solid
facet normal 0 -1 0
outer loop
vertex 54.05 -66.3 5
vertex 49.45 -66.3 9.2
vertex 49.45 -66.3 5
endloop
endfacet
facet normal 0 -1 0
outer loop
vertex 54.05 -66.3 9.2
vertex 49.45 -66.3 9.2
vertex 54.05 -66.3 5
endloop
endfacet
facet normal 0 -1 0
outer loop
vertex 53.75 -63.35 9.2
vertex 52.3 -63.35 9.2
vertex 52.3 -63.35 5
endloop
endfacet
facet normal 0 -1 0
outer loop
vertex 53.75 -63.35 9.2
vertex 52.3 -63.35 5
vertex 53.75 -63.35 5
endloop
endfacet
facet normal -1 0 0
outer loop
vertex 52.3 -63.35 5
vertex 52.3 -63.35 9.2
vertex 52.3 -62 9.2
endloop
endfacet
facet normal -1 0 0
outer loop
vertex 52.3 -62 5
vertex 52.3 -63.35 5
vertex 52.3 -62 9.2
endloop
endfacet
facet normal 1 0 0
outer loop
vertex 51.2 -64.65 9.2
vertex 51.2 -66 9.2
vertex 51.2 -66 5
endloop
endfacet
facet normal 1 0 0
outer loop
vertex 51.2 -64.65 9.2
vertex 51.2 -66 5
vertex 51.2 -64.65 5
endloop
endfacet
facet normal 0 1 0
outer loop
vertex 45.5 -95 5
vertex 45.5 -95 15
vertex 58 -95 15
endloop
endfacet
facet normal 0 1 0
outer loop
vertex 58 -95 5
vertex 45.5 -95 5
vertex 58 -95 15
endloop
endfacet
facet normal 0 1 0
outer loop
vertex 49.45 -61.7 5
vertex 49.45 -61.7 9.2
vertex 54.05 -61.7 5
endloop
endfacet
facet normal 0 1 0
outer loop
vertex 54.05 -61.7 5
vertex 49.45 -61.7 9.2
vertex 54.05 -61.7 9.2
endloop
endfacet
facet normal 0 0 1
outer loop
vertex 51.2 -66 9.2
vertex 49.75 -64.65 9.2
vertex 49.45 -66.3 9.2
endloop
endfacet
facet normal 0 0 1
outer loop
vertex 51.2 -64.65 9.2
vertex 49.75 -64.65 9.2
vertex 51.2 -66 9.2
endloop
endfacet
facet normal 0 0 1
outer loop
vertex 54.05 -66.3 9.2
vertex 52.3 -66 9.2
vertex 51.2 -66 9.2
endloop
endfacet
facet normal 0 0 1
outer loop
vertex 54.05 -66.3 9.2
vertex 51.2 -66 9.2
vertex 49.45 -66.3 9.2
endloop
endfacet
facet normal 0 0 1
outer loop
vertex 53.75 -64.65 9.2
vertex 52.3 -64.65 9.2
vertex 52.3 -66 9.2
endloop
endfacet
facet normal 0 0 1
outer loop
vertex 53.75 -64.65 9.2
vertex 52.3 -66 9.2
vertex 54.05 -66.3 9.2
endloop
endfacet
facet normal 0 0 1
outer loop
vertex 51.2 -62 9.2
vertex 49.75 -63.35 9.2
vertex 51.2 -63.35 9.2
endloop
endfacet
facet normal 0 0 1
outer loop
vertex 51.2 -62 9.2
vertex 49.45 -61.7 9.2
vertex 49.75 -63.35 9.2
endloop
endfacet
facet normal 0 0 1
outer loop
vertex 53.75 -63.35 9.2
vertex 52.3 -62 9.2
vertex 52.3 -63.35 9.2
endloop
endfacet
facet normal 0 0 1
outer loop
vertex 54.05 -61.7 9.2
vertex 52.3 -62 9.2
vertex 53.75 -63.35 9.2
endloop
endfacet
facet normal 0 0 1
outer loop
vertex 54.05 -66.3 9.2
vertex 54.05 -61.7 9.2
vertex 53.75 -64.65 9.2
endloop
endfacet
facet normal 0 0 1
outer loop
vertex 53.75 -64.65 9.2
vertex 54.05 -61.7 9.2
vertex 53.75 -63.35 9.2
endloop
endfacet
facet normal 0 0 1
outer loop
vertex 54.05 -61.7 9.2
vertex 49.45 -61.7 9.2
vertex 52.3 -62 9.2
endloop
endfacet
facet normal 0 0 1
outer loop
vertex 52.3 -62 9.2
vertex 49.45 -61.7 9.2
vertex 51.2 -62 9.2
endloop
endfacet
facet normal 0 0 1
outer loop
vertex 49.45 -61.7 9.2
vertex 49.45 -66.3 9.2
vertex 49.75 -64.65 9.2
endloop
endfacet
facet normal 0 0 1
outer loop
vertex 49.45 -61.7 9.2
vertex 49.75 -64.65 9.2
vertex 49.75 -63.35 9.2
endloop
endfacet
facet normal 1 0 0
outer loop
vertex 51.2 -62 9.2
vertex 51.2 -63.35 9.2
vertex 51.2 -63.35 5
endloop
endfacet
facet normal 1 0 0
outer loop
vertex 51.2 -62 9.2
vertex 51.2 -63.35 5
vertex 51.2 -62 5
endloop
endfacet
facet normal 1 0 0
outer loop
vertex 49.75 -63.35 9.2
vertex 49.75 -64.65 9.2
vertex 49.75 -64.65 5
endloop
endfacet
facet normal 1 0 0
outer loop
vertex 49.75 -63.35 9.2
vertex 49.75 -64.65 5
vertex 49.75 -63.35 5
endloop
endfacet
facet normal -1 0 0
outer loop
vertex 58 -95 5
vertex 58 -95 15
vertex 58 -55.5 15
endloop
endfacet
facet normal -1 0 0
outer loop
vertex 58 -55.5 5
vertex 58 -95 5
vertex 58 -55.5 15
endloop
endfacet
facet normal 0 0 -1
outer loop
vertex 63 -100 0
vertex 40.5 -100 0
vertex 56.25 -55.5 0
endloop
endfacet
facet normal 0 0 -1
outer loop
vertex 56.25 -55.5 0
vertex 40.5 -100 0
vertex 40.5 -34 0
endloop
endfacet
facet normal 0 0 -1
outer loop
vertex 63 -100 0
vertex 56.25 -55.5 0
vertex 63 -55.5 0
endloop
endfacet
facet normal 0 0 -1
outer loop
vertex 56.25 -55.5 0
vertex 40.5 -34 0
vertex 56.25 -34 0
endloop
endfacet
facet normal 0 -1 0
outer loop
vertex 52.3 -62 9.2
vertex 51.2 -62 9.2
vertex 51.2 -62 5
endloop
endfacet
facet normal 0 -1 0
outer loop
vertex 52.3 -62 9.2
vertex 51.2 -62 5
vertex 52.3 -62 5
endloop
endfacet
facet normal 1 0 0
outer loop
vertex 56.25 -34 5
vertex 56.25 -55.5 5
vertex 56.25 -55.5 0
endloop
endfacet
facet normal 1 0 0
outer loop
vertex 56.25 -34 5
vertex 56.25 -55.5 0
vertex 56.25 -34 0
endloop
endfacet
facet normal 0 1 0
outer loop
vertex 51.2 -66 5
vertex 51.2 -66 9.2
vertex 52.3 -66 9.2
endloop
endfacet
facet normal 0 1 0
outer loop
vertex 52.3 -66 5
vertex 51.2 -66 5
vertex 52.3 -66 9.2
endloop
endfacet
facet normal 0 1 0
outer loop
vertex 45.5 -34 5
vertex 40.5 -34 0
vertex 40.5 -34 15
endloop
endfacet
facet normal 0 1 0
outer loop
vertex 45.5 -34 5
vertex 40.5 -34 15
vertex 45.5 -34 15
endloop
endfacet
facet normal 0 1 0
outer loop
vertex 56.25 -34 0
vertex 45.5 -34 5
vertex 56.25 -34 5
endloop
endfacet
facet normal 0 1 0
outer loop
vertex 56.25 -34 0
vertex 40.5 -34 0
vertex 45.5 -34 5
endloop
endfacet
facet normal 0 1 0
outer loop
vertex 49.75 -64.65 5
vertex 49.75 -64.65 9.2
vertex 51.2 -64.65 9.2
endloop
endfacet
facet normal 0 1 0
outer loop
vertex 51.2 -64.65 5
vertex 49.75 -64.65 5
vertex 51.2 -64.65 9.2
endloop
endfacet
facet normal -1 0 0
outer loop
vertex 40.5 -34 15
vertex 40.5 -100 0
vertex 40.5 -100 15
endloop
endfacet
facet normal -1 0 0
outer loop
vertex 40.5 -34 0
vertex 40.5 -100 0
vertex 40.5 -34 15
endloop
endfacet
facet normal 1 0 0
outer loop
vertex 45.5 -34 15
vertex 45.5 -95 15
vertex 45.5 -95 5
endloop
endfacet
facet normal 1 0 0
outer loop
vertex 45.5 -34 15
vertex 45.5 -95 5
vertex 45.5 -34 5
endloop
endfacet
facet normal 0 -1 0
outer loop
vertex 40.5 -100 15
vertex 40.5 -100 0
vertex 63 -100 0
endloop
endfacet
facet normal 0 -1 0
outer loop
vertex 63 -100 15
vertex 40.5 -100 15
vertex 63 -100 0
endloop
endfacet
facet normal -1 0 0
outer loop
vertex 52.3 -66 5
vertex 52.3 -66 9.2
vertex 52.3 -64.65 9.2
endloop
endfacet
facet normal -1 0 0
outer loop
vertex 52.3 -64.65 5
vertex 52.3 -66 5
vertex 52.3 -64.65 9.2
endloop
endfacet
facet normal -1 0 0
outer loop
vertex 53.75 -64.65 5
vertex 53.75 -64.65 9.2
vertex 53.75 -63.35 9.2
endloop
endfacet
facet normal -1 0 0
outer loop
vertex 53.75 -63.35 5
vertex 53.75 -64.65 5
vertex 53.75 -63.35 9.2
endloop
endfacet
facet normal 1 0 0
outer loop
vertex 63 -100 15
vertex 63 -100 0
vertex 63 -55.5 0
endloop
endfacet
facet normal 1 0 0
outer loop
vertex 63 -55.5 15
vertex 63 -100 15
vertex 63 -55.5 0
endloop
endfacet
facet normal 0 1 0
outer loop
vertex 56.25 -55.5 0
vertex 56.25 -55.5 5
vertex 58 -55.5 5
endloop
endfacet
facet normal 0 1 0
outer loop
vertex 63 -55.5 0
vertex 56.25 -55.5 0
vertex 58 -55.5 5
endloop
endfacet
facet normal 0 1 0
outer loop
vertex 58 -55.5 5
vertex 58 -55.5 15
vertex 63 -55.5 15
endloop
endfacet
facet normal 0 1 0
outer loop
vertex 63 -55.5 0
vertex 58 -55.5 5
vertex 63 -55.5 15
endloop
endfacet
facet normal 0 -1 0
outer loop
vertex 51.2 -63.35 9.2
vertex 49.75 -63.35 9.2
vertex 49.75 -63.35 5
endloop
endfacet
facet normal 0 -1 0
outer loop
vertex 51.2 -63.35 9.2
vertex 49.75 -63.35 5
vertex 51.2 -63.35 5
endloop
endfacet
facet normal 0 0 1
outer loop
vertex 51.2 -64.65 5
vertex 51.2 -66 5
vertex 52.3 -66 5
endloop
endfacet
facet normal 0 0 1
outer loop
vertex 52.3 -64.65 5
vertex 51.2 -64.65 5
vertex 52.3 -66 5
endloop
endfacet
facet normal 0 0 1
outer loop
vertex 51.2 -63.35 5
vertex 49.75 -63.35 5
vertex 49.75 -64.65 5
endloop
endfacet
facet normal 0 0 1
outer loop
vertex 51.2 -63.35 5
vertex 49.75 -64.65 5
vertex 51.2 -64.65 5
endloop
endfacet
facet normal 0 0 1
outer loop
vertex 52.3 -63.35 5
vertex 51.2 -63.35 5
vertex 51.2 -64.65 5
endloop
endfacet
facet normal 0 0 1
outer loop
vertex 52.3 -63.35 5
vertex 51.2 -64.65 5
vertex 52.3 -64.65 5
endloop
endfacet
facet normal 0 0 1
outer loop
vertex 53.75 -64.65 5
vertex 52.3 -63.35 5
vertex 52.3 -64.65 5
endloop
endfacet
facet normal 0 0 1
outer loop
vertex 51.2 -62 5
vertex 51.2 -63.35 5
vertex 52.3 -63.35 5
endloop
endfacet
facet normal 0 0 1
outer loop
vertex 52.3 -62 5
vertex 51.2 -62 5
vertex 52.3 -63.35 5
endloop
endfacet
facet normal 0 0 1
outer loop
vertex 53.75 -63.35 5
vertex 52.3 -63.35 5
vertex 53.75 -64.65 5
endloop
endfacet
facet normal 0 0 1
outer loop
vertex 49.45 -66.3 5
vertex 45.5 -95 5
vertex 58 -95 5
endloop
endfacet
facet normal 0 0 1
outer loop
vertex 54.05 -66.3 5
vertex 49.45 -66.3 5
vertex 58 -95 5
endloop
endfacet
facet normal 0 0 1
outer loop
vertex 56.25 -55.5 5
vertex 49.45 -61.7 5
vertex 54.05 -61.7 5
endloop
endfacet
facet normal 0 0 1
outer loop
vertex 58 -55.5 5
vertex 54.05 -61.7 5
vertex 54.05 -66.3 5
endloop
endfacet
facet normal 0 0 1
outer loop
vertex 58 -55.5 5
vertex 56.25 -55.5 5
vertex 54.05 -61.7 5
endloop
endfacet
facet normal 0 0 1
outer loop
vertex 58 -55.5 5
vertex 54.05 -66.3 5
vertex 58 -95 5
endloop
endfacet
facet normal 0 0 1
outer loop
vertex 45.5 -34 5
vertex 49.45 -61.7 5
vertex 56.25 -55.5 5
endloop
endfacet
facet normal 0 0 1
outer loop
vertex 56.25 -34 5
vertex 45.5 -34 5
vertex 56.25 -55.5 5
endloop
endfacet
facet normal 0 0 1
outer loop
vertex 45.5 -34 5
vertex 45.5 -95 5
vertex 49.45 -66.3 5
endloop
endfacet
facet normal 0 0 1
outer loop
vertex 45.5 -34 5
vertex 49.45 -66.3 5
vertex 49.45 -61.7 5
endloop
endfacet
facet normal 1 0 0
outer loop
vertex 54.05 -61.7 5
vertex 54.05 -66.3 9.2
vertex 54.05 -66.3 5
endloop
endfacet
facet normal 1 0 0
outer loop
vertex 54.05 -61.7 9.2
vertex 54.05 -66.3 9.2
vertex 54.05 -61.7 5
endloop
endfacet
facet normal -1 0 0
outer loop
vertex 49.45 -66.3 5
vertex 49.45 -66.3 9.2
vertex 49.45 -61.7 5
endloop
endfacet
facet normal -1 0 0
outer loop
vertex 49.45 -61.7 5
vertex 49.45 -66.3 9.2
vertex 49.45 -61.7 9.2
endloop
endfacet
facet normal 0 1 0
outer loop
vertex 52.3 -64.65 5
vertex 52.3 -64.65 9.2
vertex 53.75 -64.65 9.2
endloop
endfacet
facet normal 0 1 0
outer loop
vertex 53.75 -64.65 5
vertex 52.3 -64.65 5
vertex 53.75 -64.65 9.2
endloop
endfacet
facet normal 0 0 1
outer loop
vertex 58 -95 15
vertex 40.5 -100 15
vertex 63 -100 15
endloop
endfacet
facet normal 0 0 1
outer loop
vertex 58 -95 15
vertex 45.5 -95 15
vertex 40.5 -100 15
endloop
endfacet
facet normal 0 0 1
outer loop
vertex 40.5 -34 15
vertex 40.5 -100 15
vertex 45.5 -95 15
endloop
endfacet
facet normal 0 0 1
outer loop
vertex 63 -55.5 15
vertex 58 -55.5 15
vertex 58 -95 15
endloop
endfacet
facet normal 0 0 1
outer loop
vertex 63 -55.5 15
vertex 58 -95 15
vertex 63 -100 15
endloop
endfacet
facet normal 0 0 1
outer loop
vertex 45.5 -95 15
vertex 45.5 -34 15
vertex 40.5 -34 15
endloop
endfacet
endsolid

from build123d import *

# Parameters (mm, degrees)
SKETCH_W        = 22.5
SKETCH_H        = 66
PAD_DEPTH       = 15
SKETCH001_W     = 12.5
SKETCH001_H     = 75
SKETCH001_W_2   = 4.6
SKETCH001_H_2   = 4.6
POCKET_DEPTH    = 10
SKETCH002_W     = 7
SKETCH002_H     = 7
POCKET001_DEPTH = 5.8
SKETCH004_W     = 1.1
SKETCH004_H     = 4
POCKET002_DEPTH = 10
SKETCH005_W     = 4
SKETCH005_H     = 1.3
POCKET003_DEPTH = 10
SKETCH007_W     = 19.75
SKETCH007_H     = 26.5
POCKET004_DEPTH = 20


with BuildPart() as part:
    # Sketch → Pad (new body)
    with BuildSketch(Plane.XY):
        with Locations((51.75, -67)):
            Rectangle(SKETCH_W, SKETCH_H)
    extrude(amount=PAD_DEPTH)

    # Sketch001 (on DatumPlane) → Pocket (cut)
    with BuildSketch(Plane.XY.offset(15)):
        with Locations((51.75, -57.5)):
            Rectangle(SKETCH001_W, SKETCH001_H)
        with Locations((51.75, -64)):
            Rectangle(SKETCH001_W_2, SKETCH001_H_2, mode=Mode.SUBTRACT)
    extrude(amount=-POCKET_DEPTH, mode=Mode.SUBTRACT)

    # Sketch002 (on DatumPlane) → Pocket001 (cut)
    with BuildSketch(Plane.XY.offset(15)):
        with Locations((51.5, -63.5)):
            Rectangle(SKETCH002_W, SKETCH002_H)
    extrude(amount=-POCKET001_DEPTH, mode=Mode.SUBTRACT)

    # Sketch004 (on DatumPlane) → Pocket002 (cut)
    with BuildSketch(Plane.XY.offset(15)):
        with Locations((51.75, -64)):
            Rectangle(SKETCH004_W, SKETCH004_H)
    extrude(amount=-POCKET002_DEPTH, mode=Mode.SUBTRACT)

    # Sketch005 (on DatumPlane) → Pocket003 (cut)
    with BuildSketch(Plane.XY.offset(15)):
        with Locations((51.75, -64)):
            Rectangle(SKETCH005_W, SKETCH005_H)
    extrude(amount=-POCKET003_DEPTH, mode=Mode.SUBTRACT)

    # Sketch007 (on DatumPlane) → Pocket004 (cut)
    with BuildSketch(Plane.XY.offset(15)):
        with Locations((66.125, -42.25)):
            Rectangle(SKETCH007_W, SKETCH007_H)
    extrude(amount=-POCKET004_DEPTH, mode=Mode.SUBTRACT)


solid = part.part
